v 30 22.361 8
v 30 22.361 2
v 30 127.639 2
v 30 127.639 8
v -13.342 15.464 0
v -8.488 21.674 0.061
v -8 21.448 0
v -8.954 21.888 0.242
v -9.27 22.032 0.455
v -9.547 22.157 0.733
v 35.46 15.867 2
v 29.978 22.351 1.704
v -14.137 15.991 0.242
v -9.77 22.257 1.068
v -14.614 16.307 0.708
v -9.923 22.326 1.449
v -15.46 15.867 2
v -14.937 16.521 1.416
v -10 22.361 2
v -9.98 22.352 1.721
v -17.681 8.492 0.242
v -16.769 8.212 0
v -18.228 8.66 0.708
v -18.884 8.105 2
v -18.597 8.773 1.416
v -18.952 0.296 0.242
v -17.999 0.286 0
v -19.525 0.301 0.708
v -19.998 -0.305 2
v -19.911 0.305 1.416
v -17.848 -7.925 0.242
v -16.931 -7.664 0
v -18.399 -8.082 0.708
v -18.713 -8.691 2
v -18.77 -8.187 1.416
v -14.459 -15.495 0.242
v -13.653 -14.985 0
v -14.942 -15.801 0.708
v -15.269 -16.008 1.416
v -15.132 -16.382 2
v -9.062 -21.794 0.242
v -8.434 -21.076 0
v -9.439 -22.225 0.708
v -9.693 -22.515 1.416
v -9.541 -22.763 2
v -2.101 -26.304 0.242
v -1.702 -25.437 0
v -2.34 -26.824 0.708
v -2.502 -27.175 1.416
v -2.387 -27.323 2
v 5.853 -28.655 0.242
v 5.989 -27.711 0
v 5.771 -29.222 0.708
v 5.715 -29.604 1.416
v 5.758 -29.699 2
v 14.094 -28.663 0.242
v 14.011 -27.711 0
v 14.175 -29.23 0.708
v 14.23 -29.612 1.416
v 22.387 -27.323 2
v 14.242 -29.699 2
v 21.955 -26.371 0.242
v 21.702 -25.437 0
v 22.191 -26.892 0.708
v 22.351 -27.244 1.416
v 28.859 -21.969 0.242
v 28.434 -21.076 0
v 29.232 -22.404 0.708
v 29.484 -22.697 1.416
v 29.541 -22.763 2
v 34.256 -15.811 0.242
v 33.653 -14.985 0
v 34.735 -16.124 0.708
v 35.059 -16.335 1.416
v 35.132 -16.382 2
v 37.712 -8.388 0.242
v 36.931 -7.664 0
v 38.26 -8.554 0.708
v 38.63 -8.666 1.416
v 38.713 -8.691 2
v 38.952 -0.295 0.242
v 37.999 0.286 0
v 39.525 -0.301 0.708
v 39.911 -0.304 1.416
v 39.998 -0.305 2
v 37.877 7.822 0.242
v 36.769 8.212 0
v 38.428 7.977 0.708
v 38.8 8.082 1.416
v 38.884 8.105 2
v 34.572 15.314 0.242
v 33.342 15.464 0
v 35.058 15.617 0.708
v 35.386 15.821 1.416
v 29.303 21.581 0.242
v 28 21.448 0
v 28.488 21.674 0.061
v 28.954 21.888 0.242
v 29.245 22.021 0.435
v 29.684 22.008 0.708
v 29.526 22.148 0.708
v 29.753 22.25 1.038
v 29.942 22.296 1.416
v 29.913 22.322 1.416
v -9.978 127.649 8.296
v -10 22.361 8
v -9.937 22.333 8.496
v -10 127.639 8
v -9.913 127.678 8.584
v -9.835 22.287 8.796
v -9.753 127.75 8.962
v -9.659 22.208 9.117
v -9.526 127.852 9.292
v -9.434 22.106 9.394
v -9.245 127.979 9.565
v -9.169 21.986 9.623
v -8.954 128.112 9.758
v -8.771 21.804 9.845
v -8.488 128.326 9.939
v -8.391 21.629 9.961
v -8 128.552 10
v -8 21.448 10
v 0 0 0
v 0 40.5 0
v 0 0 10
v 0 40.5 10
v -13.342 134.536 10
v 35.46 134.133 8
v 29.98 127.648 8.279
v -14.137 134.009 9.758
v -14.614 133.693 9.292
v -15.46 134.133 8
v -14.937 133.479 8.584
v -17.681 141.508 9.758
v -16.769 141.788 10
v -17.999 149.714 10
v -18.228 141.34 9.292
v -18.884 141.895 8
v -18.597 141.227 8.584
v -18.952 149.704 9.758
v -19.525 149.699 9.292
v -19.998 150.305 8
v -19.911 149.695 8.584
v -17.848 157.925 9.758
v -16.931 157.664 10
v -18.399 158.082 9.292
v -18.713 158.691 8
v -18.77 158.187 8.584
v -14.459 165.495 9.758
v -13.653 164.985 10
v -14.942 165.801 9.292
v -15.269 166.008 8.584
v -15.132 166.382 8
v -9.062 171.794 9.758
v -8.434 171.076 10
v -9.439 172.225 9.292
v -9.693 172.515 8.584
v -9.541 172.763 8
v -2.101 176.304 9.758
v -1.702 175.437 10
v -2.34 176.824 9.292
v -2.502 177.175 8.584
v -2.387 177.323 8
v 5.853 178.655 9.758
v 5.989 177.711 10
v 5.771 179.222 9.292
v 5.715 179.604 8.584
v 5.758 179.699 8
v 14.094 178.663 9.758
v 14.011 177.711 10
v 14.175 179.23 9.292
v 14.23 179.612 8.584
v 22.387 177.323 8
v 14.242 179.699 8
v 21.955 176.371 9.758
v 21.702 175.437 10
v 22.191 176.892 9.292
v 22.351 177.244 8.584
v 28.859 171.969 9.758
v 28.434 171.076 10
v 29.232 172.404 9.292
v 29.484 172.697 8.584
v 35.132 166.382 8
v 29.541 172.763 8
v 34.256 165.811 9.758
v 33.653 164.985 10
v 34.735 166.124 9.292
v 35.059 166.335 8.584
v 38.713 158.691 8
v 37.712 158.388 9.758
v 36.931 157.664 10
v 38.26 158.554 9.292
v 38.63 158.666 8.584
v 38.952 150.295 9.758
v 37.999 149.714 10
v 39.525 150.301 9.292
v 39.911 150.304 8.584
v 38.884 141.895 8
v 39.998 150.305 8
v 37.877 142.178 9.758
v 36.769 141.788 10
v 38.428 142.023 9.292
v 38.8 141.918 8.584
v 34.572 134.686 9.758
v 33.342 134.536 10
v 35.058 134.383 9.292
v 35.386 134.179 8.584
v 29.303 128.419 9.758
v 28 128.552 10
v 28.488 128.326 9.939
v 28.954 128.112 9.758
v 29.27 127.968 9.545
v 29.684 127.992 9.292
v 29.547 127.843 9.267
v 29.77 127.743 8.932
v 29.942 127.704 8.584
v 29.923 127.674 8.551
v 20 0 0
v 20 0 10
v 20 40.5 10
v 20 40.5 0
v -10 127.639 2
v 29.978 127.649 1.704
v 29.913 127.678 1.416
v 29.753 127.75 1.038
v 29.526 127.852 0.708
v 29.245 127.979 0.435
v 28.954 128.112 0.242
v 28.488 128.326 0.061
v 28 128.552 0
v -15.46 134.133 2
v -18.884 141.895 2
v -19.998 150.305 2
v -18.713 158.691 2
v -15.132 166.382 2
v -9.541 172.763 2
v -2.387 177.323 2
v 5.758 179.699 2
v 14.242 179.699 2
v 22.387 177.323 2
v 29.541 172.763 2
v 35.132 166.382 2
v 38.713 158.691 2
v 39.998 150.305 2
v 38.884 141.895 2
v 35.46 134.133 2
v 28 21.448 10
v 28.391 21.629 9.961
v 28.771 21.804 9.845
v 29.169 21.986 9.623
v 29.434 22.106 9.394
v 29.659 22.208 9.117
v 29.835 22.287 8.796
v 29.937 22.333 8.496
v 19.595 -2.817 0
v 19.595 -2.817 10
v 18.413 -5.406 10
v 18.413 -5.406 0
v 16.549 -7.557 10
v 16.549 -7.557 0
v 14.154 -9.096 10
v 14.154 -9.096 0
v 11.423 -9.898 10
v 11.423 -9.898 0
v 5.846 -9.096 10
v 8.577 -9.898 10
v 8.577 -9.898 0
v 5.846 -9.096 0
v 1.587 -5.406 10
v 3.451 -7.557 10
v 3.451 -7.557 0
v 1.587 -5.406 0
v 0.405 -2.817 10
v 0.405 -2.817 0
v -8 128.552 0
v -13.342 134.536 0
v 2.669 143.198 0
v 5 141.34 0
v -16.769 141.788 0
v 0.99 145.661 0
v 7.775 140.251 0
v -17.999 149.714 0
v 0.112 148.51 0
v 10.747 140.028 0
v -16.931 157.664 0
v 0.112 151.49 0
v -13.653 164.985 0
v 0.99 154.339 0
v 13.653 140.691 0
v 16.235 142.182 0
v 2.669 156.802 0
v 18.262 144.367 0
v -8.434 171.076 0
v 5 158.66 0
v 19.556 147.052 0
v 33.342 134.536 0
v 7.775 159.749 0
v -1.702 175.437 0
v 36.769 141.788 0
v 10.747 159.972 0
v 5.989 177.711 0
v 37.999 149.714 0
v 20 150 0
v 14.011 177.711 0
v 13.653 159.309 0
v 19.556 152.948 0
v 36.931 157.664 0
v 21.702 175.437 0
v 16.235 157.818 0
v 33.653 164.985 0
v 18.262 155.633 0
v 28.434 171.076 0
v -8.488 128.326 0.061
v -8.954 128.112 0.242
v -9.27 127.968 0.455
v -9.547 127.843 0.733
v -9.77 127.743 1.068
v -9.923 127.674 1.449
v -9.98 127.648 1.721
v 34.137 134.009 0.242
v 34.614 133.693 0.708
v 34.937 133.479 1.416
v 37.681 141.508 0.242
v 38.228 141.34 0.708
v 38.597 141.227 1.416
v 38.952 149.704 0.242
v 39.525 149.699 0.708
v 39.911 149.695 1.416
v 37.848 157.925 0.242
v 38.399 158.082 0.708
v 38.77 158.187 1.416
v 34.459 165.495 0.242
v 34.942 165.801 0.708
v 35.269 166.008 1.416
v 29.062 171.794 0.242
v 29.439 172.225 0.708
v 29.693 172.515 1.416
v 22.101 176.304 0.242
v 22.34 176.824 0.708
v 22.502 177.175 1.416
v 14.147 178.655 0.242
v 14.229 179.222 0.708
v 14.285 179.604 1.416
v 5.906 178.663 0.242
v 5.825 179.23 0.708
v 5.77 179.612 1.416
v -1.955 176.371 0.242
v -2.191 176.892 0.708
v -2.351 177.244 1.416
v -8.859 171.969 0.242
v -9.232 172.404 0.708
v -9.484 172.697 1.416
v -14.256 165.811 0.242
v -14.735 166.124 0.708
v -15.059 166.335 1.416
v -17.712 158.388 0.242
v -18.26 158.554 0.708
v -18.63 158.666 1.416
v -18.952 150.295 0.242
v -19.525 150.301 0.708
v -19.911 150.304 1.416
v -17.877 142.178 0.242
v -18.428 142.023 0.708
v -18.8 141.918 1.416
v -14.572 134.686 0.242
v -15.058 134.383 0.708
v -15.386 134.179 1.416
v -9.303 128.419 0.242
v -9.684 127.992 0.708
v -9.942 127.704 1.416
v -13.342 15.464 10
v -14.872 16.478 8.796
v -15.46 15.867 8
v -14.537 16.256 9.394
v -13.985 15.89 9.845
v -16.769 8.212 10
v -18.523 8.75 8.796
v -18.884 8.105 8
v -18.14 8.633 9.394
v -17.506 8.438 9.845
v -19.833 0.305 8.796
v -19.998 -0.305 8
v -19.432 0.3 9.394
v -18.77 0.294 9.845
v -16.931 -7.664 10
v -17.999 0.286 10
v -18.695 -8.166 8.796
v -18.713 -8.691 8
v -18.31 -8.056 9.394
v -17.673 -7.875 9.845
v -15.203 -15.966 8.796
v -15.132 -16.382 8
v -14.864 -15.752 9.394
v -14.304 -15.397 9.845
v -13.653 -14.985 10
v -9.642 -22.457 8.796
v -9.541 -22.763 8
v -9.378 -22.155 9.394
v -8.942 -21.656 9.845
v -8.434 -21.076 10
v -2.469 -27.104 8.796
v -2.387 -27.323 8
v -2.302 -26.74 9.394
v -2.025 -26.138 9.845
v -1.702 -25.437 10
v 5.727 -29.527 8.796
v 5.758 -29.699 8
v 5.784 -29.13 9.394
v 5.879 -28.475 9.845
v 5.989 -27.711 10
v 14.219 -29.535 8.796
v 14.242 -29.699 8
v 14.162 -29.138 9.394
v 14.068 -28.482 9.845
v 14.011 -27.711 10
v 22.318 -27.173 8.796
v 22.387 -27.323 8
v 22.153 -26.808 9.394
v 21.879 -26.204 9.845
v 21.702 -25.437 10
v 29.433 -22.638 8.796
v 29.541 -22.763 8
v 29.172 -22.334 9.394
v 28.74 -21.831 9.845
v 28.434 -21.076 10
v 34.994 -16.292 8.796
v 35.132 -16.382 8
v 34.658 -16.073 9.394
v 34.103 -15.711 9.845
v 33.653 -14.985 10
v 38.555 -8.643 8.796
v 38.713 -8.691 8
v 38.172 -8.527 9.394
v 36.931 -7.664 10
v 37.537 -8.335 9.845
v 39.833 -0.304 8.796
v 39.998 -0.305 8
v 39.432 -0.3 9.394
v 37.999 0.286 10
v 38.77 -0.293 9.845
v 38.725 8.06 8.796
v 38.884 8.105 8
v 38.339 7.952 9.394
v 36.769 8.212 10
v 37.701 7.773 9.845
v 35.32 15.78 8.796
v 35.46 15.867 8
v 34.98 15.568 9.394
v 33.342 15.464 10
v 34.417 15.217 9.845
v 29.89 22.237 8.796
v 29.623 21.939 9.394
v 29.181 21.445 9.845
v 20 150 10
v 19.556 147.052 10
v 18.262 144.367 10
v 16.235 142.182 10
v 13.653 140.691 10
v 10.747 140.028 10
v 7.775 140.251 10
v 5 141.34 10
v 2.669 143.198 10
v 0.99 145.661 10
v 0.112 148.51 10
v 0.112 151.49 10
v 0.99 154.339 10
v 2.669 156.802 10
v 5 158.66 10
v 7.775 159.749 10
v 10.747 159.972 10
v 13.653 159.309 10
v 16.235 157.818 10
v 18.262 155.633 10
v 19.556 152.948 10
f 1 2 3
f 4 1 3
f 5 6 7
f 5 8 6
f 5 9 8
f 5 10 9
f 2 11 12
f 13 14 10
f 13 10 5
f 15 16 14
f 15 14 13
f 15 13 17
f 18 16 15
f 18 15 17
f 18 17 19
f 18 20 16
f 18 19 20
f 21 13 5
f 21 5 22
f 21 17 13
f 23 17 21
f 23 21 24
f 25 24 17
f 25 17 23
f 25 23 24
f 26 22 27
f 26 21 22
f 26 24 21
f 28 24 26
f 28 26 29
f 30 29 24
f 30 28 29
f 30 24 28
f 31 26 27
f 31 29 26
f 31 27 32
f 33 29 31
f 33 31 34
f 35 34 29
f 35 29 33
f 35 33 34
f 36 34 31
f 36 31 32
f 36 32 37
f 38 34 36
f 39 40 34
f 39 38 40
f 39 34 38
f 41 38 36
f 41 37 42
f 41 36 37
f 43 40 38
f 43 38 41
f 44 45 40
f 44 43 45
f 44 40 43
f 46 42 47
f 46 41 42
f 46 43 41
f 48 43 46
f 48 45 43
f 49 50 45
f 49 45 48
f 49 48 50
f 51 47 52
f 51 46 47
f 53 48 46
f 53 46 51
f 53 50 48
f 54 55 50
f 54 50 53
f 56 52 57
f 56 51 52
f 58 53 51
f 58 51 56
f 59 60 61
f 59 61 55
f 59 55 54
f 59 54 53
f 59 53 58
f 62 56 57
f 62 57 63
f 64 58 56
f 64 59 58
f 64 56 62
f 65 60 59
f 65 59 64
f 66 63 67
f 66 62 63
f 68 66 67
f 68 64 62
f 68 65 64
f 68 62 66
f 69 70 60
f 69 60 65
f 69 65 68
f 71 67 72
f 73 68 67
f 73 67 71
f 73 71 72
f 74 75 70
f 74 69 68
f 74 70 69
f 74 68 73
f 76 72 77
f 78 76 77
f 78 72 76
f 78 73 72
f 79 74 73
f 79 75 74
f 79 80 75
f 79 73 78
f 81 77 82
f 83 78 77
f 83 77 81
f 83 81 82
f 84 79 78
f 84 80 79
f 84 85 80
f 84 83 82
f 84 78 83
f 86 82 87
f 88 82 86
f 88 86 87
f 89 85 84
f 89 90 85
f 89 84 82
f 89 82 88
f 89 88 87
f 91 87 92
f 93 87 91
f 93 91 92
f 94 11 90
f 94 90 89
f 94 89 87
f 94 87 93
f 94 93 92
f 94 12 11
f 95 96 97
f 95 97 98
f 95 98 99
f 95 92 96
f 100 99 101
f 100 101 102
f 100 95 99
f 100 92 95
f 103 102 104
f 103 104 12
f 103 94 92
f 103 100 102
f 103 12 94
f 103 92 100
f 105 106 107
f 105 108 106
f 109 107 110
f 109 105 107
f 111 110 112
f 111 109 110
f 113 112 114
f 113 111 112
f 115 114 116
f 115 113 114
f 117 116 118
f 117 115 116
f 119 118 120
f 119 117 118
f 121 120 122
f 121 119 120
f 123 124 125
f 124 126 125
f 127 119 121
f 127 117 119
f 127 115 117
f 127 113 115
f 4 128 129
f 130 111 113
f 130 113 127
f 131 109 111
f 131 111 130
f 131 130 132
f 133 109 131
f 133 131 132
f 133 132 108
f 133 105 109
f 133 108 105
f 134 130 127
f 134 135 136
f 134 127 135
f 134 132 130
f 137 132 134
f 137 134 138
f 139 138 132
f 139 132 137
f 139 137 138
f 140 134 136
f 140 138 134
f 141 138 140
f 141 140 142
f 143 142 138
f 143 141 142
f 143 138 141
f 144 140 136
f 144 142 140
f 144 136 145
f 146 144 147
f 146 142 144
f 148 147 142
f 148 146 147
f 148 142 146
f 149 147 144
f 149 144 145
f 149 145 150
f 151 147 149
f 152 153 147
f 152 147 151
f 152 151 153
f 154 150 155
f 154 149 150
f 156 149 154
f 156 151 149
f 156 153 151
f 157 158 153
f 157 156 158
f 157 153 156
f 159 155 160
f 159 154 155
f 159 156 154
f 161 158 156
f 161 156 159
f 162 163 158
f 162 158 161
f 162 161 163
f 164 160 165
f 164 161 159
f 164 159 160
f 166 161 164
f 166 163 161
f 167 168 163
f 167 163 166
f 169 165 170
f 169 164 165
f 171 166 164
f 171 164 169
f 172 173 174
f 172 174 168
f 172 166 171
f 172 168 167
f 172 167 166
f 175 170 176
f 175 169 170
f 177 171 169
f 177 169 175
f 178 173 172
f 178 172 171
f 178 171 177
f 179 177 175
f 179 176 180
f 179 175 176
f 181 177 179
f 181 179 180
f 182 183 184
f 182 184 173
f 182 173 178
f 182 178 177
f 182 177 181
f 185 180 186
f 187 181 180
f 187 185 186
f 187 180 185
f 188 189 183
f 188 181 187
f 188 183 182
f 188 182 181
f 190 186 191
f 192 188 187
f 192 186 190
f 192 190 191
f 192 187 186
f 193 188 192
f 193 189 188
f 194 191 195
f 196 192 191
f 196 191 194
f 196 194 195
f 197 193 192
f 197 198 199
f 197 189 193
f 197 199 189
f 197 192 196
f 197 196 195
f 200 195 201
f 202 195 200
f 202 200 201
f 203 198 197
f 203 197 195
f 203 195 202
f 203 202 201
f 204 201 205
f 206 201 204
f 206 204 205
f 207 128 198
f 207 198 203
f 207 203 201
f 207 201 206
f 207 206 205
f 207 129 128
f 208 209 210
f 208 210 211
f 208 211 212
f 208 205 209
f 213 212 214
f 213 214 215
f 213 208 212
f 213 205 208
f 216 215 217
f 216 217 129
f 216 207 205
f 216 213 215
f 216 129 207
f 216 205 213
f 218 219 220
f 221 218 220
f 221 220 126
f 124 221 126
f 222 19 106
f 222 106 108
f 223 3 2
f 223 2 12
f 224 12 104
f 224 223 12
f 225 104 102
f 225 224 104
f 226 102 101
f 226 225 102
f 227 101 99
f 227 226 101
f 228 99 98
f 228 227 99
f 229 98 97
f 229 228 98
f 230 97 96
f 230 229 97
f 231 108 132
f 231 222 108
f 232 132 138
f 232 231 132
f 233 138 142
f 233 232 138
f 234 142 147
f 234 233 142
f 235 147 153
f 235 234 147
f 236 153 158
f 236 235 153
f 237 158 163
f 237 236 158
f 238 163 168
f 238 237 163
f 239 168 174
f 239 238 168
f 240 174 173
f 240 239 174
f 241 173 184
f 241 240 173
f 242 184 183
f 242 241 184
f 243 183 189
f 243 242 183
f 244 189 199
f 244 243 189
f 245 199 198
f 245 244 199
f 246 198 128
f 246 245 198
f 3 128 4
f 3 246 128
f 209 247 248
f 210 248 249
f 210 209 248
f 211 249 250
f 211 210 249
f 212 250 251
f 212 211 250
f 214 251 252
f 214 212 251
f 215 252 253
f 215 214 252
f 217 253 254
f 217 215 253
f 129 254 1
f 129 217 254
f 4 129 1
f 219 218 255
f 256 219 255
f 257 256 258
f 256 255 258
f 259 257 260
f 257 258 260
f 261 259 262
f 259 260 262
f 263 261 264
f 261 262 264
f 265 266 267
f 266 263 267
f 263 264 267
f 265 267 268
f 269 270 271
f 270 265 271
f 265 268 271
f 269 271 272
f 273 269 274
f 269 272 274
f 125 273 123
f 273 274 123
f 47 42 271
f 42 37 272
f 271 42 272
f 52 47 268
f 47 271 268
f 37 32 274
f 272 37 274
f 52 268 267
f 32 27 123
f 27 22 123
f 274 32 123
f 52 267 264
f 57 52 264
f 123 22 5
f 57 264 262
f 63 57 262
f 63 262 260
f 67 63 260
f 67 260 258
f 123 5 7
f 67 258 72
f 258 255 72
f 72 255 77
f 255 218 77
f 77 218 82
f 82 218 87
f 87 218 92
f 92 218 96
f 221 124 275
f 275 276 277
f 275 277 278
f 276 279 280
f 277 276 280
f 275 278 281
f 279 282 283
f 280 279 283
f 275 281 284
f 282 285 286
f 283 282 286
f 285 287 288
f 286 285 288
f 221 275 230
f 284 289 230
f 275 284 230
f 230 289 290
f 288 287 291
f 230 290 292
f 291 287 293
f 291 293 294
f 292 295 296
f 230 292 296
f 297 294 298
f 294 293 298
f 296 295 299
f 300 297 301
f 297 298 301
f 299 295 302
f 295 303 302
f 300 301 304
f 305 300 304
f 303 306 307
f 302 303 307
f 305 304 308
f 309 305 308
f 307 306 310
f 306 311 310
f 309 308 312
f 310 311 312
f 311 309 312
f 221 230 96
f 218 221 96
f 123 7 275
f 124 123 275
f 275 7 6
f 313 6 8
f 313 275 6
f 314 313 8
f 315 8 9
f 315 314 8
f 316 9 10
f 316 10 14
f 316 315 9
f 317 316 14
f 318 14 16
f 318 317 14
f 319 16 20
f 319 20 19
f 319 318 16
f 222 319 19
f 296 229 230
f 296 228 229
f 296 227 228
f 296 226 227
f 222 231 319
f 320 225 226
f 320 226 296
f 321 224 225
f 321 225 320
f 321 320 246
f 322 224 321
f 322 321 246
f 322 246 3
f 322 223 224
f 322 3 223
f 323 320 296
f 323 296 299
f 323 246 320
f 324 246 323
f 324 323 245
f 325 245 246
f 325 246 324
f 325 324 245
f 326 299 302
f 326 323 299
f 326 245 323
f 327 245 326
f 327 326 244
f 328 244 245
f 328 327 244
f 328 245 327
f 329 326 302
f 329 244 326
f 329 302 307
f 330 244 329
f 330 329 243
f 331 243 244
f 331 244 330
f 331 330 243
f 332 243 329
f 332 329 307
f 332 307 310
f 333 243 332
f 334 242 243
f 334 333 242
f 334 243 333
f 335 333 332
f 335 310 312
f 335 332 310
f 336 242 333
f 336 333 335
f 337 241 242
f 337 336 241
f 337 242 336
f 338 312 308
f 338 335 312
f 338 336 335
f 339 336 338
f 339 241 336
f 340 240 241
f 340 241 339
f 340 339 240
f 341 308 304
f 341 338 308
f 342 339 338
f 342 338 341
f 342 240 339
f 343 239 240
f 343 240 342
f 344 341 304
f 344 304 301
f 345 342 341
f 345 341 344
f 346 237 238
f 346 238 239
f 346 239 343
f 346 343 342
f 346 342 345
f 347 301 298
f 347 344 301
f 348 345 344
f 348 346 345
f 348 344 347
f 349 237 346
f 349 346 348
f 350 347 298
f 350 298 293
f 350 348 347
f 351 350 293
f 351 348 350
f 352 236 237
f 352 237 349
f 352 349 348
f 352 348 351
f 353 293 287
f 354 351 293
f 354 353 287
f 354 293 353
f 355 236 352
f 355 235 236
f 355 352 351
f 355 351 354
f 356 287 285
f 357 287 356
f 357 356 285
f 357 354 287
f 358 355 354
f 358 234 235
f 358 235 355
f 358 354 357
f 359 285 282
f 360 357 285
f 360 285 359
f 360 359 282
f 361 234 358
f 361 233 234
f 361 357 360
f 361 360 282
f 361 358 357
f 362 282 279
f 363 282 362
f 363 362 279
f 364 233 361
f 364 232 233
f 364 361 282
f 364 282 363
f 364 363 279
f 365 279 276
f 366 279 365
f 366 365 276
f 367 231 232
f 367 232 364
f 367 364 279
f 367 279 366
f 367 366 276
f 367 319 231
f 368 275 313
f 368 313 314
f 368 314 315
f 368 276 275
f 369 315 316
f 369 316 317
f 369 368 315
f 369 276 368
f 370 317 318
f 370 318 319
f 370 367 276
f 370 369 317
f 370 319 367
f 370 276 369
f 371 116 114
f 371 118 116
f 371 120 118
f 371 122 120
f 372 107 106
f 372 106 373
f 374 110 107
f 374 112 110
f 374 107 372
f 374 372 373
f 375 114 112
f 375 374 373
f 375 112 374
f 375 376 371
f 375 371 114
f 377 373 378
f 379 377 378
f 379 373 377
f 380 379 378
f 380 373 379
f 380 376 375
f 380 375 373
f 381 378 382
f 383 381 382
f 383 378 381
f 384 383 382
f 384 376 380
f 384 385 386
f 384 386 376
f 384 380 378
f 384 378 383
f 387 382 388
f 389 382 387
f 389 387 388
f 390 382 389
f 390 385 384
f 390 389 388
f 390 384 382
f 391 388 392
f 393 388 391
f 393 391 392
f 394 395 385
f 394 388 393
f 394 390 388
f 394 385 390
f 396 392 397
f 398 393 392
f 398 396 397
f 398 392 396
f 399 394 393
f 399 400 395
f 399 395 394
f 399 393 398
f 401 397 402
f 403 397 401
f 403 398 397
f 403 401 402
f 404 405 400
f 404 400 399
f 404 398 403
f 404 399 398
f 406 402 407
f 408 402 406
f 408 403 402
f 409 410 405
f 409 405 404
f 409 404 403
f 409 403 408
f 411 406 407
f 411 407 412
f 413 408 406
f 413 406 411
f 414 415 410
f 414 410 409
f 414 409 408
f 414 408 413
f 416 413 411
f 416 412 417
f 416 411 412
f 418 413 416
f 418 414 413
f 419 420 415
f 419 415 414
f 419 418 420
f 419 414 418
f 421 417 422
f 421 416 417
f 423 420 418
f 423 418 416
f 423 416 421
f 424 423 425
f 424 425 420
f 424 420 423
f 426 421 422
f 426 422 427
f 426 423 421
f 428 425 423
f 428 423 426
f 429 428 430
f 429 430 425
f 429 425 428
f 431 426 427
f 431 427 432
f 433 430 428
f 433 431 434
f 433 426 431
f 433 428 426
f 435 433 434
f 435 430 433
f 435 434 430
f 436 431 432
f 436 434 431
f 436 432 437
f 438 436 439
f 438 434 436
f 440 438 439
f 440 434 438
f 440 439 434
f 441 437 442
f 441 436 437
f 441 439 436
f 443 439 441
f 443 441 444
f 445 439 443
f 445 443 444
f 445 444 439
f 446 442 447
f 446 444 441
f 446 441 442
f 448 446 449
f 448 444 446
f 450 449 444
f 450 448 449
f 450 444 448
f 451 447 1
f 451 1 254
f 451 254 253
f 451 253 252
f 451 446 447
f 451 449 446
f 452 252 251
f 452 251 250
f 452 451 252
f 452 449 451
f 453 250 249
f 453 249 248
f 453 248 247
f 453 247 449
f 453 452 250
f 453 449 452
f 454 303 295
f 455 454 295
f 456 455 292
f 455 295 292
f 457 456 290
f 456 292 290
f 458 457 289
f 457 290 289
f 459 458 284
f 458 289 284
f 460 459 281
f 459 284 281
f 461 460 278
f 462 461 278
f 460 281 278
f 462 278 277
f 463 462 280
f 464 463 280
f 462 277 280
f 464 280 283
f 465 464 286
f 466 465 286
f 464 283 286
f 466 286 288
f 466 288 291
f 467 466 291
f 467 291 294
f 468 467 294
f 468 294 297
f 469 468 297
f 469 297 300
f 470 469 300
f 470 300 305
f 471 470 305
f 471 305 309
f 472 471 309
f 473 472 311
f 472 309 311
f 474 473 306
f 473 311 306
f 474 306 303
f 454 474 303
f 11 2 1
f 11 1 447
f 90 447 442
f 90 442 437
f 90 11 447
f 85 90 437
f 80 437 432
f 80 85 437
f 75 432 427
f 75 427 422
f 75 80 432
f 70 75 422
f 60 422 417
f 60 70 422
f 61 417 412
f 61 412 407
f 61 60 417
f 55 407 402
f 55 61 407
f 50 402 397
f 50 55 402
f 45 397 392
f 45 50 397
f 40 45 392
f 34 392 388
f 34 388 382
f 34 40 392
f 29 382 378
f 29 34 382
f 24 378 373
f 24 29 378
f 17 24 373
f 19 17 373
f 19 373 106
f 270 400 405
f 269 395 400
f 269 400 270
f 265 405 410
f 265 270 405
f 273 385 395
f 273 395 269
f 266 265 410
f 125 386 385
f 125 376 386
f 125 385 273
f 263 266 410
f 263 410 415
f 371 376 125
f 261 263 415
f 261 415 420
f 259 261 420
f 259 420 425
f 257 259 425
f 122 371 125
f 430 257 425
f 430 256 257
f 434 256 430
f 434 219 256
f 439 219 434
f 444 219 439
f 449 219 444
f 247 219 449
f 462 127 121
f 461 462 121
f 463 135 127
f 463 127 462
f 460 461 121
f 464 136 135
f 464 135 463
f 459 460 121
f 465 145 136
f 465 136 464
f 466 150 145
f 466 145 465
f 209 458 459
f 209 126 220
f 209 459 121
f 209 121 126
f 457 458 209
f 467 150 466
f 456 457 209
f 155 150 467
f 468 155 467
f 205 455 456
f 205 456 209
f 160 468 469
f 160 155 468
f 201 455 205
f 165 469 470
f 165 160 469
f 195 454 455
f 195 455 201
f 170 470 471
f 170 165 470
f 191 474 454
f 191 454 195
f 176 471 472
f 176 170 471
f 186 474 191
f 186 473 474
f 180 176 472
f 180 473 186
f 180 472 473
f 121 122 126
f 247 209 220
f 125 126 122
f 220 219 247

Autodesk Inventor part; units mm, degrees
ref_plane "YZ Plane" through (0, 0, 0) normal (1, 0, 0) x (0, 1, 0)
ref_plane "XZ Plane" through (0, 0, 0) normal (0, 1, 0) x (-1, 0, 0)
ref_plane "XY Plane" through (0, 0, 0) normal (0, 0, 1) x (1, 0, 0)
sketch "Sketch1" plane through (0, 0, 0) normal (0, 0, 1) x (1, 0, 0)
  line L0 (0, 0) -> (20, 0)
  line L1 (20, 0) -> (20, 41)
  line L2 (20, 41) -> (0, 41)
  line L3 (0, 41) -> (0, 0)
  circle A0 centre (10, 0) radius 30
  circle A1 centre (10, 0) radius 10
  line L4 (10, 0) -> (30, 0)
  line L5 (30, 0) -> (30, 150)
  line L6 (30, 150) -> (10, 150)
  line L7 (10, 150) -> (10, 0)
  line L8 (10, 0) -> (-10, 0)
  line L9 (-10, 0) -> (-10, 150)
  line L10 (-10, 150) -> (10, 150)
  line L11 (10, 150) -> (10, 0)
  circle A2 centre (10, 150) radius 30
  circle A3 centre (10, 150) radius 10
  point P0 (30, 22.3607)
  point P1 (30, 127.6393)
  point P2 (-10, 127.6393)
  point P3 (-10, 22.3607)
  dimension "d0" = 20
  dimension "d1" = 41
  dimension "d2" = 60
  dimension "d3" = 20
  dimension "d4" = 150
  dimension "d5" = 20
  dimension "d6" = 150
  dimension "d7" = 60
  dimension "d8" = 20
extrude "Extrusion1" add sketch "Sketch1" along normal blind 10 contours L8 L9 A0 L3 | L3 A0 L7 A1 | A1 L4 L5 A0 L9 L8 | A0 L9 A2 L7 L2 L3 | L3 L2 L7 A0 | A1 L7 A0 L1 | L1 A0 L5 L4 | L7 L2 L1 A0 | L1 L2 L7 A2 L5 A0 | A2 L5 L6 A3 L10 L9 | L9 L10 A3 L7 A2 | L7 A3 L6 L5 A2
fillet "Fillet1" radius 2 8 edges at (10, 180, 10) (-10, 75, 10) (10, -30, 10) (10, -30, 0) (-10, 75, 0) (10, 180, 0) (30, 75, 0) (30, 75, 10)
sketch "Sketch2" plane through (0, 0, 10) normal (0, 0, 1) x (1, 0, 0)
  line L0 (0, 0) -> (20, 0)
  line L1 (20, 0) -> (20, 40.5)
  line L2 (20, 40.5) -> (0, 40.5)
  line L3 (0, 40.5) -> (0, 0)
  dimension "d12" = 20
  dimension "d13" = 40.5
extrude "Extrusion2" cut sketch "Sketch2" against normal blind 10.6375
properties part number "First arm"
